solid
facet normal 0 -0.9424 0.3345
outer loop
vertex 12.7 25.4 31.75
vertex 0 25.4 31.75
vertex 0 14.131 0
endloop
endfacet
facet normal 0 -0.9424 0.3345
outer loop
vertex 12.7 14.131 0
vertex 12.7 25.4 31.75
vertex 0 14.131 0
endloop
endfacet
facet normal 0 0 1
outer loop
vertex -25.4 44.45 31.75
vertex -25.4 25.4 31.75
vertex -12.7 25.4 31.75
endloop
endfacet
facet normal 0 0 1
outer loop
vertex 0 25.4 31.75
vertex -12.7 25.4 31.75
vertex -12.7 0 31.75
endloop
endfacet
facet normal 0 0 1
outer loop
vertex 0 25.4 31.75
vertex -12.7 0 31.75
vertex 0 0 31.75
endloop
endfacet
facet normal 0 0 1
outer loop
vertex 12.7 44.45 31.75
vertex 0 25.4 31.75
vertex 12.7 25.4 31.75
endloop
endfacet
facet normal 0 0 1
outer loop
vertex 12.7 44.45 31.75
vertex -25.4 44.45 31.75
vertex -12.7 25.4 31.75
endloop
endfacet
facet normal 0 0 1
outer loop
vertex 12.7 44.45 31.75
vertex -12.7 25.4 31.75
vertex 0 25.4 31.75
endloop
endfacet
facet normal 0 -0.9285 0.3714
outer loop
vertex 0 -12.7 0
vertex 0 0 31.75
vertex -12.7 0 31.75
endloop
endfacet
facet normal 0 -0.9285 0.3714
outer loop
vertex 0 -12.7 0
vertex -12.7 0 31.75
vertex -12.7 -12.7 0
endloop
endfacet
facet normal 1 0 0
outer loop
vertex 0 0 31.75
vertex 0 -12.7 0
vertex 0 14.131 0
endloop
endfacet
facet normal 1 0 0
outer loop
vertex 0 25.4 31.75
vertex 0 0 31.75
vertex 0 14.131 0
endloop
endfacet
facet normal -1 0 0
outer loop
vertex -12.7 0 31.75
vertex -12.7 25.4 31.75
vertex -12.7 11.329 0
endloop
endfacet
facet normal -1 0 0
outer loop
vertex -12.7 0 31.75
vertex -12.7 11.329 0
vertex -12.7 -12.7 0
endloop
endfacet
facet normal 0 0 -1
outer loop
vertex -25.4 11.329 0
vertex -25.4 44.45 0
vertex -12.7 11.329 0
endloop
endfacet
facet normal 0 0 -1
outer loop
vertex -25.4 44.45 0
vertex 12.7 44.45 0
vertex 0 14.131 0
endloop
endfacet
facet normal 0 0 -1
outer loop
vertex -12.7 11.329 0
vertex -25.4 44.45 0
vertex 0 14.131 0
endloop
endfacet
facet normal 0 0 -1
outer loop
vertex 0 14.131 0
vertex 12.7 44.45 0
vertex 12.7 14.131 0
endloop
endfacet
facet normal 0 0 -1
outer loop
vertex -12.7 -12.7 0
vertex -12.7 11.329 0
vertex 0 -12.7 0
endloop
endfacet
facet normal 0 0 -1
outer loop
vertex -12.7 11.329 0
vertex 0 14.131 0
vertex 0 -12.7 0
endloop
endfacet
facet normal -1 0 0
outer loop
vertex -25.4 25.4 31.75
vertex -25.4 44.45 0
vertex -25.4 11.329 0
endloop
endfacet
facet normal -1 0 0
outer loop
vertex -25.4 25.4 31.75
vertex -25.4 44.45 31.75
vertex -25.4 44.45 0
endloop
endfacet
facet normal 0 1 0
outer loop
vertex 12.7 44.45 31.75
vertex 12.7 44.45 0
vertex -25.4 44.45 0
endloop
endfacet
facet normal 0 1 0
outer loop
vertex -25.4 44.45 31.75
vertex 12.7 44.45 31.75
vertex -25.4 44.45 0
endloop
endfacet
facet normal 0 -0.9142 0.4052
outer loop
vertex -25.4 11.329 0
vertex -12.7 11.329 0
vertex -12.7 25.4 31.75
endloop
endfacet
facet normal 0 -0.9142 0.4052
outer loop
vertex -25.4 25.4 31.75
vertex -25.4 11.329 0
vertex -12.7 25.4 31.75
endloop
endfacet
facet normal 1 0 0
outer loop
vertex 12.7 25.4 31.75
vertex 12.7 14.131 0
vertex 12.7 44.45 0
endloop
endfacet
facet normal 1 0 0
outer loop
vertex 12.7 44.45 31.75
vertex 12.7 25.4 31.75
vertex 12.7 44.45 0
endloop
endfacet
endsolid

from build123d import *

# Parameters (mm, degrees)
F1_DEPTH = 31.75
F3_DEPTH = 12.7
F5_DEPTH = 12.7
F7_DEPTH = 12.7


with BuildPart() as f1:
    # F0 (on Top) → F1 (new body)
    with BuildSketch(Plane.XY):
        Polygon((-12.7, 0), (0, 0), (0, 25.4), (12.7, 25.4), (12.7, 44.45), (-25.4, 44.45), (-25.4, 25.4), (-12.7, 25.4), align=None)
    extrude(amount=F1_DEPTH)

    # F2 (on face) → F3 (join)
    with BuildSketch(Plane.YZ):
        Polygon((25.4, 31.75), (14.131341, 0), (25.4, 0), align=None)
    extrude(amount=F3_DEPTH)

    # F4 (on face) → F5 (join)
    with BuildSketch(Plane(origin=(-12.7, 0, 0), x_dir=(0, -1, 0), z_dir=(-1, 0, 0))):
        Polygon((-25.4, 0), (-11.329167, 0), (-25.4, 31.75), align=None)
    extrude(amount=F5_DEPTH)

    # F6 (on face) → F7 (join)
    with BuildSketch(Plane.YZ):
        Polygon((0, 31.75), (0, 0), (14.131341, 0), (25.4, 31.75), align=None)
        Polygon((-12.7, 0), (0, 0), (0, 31.75), align=None)
    extrude(amount=-F7_DEPTH)


solid = f1.part
